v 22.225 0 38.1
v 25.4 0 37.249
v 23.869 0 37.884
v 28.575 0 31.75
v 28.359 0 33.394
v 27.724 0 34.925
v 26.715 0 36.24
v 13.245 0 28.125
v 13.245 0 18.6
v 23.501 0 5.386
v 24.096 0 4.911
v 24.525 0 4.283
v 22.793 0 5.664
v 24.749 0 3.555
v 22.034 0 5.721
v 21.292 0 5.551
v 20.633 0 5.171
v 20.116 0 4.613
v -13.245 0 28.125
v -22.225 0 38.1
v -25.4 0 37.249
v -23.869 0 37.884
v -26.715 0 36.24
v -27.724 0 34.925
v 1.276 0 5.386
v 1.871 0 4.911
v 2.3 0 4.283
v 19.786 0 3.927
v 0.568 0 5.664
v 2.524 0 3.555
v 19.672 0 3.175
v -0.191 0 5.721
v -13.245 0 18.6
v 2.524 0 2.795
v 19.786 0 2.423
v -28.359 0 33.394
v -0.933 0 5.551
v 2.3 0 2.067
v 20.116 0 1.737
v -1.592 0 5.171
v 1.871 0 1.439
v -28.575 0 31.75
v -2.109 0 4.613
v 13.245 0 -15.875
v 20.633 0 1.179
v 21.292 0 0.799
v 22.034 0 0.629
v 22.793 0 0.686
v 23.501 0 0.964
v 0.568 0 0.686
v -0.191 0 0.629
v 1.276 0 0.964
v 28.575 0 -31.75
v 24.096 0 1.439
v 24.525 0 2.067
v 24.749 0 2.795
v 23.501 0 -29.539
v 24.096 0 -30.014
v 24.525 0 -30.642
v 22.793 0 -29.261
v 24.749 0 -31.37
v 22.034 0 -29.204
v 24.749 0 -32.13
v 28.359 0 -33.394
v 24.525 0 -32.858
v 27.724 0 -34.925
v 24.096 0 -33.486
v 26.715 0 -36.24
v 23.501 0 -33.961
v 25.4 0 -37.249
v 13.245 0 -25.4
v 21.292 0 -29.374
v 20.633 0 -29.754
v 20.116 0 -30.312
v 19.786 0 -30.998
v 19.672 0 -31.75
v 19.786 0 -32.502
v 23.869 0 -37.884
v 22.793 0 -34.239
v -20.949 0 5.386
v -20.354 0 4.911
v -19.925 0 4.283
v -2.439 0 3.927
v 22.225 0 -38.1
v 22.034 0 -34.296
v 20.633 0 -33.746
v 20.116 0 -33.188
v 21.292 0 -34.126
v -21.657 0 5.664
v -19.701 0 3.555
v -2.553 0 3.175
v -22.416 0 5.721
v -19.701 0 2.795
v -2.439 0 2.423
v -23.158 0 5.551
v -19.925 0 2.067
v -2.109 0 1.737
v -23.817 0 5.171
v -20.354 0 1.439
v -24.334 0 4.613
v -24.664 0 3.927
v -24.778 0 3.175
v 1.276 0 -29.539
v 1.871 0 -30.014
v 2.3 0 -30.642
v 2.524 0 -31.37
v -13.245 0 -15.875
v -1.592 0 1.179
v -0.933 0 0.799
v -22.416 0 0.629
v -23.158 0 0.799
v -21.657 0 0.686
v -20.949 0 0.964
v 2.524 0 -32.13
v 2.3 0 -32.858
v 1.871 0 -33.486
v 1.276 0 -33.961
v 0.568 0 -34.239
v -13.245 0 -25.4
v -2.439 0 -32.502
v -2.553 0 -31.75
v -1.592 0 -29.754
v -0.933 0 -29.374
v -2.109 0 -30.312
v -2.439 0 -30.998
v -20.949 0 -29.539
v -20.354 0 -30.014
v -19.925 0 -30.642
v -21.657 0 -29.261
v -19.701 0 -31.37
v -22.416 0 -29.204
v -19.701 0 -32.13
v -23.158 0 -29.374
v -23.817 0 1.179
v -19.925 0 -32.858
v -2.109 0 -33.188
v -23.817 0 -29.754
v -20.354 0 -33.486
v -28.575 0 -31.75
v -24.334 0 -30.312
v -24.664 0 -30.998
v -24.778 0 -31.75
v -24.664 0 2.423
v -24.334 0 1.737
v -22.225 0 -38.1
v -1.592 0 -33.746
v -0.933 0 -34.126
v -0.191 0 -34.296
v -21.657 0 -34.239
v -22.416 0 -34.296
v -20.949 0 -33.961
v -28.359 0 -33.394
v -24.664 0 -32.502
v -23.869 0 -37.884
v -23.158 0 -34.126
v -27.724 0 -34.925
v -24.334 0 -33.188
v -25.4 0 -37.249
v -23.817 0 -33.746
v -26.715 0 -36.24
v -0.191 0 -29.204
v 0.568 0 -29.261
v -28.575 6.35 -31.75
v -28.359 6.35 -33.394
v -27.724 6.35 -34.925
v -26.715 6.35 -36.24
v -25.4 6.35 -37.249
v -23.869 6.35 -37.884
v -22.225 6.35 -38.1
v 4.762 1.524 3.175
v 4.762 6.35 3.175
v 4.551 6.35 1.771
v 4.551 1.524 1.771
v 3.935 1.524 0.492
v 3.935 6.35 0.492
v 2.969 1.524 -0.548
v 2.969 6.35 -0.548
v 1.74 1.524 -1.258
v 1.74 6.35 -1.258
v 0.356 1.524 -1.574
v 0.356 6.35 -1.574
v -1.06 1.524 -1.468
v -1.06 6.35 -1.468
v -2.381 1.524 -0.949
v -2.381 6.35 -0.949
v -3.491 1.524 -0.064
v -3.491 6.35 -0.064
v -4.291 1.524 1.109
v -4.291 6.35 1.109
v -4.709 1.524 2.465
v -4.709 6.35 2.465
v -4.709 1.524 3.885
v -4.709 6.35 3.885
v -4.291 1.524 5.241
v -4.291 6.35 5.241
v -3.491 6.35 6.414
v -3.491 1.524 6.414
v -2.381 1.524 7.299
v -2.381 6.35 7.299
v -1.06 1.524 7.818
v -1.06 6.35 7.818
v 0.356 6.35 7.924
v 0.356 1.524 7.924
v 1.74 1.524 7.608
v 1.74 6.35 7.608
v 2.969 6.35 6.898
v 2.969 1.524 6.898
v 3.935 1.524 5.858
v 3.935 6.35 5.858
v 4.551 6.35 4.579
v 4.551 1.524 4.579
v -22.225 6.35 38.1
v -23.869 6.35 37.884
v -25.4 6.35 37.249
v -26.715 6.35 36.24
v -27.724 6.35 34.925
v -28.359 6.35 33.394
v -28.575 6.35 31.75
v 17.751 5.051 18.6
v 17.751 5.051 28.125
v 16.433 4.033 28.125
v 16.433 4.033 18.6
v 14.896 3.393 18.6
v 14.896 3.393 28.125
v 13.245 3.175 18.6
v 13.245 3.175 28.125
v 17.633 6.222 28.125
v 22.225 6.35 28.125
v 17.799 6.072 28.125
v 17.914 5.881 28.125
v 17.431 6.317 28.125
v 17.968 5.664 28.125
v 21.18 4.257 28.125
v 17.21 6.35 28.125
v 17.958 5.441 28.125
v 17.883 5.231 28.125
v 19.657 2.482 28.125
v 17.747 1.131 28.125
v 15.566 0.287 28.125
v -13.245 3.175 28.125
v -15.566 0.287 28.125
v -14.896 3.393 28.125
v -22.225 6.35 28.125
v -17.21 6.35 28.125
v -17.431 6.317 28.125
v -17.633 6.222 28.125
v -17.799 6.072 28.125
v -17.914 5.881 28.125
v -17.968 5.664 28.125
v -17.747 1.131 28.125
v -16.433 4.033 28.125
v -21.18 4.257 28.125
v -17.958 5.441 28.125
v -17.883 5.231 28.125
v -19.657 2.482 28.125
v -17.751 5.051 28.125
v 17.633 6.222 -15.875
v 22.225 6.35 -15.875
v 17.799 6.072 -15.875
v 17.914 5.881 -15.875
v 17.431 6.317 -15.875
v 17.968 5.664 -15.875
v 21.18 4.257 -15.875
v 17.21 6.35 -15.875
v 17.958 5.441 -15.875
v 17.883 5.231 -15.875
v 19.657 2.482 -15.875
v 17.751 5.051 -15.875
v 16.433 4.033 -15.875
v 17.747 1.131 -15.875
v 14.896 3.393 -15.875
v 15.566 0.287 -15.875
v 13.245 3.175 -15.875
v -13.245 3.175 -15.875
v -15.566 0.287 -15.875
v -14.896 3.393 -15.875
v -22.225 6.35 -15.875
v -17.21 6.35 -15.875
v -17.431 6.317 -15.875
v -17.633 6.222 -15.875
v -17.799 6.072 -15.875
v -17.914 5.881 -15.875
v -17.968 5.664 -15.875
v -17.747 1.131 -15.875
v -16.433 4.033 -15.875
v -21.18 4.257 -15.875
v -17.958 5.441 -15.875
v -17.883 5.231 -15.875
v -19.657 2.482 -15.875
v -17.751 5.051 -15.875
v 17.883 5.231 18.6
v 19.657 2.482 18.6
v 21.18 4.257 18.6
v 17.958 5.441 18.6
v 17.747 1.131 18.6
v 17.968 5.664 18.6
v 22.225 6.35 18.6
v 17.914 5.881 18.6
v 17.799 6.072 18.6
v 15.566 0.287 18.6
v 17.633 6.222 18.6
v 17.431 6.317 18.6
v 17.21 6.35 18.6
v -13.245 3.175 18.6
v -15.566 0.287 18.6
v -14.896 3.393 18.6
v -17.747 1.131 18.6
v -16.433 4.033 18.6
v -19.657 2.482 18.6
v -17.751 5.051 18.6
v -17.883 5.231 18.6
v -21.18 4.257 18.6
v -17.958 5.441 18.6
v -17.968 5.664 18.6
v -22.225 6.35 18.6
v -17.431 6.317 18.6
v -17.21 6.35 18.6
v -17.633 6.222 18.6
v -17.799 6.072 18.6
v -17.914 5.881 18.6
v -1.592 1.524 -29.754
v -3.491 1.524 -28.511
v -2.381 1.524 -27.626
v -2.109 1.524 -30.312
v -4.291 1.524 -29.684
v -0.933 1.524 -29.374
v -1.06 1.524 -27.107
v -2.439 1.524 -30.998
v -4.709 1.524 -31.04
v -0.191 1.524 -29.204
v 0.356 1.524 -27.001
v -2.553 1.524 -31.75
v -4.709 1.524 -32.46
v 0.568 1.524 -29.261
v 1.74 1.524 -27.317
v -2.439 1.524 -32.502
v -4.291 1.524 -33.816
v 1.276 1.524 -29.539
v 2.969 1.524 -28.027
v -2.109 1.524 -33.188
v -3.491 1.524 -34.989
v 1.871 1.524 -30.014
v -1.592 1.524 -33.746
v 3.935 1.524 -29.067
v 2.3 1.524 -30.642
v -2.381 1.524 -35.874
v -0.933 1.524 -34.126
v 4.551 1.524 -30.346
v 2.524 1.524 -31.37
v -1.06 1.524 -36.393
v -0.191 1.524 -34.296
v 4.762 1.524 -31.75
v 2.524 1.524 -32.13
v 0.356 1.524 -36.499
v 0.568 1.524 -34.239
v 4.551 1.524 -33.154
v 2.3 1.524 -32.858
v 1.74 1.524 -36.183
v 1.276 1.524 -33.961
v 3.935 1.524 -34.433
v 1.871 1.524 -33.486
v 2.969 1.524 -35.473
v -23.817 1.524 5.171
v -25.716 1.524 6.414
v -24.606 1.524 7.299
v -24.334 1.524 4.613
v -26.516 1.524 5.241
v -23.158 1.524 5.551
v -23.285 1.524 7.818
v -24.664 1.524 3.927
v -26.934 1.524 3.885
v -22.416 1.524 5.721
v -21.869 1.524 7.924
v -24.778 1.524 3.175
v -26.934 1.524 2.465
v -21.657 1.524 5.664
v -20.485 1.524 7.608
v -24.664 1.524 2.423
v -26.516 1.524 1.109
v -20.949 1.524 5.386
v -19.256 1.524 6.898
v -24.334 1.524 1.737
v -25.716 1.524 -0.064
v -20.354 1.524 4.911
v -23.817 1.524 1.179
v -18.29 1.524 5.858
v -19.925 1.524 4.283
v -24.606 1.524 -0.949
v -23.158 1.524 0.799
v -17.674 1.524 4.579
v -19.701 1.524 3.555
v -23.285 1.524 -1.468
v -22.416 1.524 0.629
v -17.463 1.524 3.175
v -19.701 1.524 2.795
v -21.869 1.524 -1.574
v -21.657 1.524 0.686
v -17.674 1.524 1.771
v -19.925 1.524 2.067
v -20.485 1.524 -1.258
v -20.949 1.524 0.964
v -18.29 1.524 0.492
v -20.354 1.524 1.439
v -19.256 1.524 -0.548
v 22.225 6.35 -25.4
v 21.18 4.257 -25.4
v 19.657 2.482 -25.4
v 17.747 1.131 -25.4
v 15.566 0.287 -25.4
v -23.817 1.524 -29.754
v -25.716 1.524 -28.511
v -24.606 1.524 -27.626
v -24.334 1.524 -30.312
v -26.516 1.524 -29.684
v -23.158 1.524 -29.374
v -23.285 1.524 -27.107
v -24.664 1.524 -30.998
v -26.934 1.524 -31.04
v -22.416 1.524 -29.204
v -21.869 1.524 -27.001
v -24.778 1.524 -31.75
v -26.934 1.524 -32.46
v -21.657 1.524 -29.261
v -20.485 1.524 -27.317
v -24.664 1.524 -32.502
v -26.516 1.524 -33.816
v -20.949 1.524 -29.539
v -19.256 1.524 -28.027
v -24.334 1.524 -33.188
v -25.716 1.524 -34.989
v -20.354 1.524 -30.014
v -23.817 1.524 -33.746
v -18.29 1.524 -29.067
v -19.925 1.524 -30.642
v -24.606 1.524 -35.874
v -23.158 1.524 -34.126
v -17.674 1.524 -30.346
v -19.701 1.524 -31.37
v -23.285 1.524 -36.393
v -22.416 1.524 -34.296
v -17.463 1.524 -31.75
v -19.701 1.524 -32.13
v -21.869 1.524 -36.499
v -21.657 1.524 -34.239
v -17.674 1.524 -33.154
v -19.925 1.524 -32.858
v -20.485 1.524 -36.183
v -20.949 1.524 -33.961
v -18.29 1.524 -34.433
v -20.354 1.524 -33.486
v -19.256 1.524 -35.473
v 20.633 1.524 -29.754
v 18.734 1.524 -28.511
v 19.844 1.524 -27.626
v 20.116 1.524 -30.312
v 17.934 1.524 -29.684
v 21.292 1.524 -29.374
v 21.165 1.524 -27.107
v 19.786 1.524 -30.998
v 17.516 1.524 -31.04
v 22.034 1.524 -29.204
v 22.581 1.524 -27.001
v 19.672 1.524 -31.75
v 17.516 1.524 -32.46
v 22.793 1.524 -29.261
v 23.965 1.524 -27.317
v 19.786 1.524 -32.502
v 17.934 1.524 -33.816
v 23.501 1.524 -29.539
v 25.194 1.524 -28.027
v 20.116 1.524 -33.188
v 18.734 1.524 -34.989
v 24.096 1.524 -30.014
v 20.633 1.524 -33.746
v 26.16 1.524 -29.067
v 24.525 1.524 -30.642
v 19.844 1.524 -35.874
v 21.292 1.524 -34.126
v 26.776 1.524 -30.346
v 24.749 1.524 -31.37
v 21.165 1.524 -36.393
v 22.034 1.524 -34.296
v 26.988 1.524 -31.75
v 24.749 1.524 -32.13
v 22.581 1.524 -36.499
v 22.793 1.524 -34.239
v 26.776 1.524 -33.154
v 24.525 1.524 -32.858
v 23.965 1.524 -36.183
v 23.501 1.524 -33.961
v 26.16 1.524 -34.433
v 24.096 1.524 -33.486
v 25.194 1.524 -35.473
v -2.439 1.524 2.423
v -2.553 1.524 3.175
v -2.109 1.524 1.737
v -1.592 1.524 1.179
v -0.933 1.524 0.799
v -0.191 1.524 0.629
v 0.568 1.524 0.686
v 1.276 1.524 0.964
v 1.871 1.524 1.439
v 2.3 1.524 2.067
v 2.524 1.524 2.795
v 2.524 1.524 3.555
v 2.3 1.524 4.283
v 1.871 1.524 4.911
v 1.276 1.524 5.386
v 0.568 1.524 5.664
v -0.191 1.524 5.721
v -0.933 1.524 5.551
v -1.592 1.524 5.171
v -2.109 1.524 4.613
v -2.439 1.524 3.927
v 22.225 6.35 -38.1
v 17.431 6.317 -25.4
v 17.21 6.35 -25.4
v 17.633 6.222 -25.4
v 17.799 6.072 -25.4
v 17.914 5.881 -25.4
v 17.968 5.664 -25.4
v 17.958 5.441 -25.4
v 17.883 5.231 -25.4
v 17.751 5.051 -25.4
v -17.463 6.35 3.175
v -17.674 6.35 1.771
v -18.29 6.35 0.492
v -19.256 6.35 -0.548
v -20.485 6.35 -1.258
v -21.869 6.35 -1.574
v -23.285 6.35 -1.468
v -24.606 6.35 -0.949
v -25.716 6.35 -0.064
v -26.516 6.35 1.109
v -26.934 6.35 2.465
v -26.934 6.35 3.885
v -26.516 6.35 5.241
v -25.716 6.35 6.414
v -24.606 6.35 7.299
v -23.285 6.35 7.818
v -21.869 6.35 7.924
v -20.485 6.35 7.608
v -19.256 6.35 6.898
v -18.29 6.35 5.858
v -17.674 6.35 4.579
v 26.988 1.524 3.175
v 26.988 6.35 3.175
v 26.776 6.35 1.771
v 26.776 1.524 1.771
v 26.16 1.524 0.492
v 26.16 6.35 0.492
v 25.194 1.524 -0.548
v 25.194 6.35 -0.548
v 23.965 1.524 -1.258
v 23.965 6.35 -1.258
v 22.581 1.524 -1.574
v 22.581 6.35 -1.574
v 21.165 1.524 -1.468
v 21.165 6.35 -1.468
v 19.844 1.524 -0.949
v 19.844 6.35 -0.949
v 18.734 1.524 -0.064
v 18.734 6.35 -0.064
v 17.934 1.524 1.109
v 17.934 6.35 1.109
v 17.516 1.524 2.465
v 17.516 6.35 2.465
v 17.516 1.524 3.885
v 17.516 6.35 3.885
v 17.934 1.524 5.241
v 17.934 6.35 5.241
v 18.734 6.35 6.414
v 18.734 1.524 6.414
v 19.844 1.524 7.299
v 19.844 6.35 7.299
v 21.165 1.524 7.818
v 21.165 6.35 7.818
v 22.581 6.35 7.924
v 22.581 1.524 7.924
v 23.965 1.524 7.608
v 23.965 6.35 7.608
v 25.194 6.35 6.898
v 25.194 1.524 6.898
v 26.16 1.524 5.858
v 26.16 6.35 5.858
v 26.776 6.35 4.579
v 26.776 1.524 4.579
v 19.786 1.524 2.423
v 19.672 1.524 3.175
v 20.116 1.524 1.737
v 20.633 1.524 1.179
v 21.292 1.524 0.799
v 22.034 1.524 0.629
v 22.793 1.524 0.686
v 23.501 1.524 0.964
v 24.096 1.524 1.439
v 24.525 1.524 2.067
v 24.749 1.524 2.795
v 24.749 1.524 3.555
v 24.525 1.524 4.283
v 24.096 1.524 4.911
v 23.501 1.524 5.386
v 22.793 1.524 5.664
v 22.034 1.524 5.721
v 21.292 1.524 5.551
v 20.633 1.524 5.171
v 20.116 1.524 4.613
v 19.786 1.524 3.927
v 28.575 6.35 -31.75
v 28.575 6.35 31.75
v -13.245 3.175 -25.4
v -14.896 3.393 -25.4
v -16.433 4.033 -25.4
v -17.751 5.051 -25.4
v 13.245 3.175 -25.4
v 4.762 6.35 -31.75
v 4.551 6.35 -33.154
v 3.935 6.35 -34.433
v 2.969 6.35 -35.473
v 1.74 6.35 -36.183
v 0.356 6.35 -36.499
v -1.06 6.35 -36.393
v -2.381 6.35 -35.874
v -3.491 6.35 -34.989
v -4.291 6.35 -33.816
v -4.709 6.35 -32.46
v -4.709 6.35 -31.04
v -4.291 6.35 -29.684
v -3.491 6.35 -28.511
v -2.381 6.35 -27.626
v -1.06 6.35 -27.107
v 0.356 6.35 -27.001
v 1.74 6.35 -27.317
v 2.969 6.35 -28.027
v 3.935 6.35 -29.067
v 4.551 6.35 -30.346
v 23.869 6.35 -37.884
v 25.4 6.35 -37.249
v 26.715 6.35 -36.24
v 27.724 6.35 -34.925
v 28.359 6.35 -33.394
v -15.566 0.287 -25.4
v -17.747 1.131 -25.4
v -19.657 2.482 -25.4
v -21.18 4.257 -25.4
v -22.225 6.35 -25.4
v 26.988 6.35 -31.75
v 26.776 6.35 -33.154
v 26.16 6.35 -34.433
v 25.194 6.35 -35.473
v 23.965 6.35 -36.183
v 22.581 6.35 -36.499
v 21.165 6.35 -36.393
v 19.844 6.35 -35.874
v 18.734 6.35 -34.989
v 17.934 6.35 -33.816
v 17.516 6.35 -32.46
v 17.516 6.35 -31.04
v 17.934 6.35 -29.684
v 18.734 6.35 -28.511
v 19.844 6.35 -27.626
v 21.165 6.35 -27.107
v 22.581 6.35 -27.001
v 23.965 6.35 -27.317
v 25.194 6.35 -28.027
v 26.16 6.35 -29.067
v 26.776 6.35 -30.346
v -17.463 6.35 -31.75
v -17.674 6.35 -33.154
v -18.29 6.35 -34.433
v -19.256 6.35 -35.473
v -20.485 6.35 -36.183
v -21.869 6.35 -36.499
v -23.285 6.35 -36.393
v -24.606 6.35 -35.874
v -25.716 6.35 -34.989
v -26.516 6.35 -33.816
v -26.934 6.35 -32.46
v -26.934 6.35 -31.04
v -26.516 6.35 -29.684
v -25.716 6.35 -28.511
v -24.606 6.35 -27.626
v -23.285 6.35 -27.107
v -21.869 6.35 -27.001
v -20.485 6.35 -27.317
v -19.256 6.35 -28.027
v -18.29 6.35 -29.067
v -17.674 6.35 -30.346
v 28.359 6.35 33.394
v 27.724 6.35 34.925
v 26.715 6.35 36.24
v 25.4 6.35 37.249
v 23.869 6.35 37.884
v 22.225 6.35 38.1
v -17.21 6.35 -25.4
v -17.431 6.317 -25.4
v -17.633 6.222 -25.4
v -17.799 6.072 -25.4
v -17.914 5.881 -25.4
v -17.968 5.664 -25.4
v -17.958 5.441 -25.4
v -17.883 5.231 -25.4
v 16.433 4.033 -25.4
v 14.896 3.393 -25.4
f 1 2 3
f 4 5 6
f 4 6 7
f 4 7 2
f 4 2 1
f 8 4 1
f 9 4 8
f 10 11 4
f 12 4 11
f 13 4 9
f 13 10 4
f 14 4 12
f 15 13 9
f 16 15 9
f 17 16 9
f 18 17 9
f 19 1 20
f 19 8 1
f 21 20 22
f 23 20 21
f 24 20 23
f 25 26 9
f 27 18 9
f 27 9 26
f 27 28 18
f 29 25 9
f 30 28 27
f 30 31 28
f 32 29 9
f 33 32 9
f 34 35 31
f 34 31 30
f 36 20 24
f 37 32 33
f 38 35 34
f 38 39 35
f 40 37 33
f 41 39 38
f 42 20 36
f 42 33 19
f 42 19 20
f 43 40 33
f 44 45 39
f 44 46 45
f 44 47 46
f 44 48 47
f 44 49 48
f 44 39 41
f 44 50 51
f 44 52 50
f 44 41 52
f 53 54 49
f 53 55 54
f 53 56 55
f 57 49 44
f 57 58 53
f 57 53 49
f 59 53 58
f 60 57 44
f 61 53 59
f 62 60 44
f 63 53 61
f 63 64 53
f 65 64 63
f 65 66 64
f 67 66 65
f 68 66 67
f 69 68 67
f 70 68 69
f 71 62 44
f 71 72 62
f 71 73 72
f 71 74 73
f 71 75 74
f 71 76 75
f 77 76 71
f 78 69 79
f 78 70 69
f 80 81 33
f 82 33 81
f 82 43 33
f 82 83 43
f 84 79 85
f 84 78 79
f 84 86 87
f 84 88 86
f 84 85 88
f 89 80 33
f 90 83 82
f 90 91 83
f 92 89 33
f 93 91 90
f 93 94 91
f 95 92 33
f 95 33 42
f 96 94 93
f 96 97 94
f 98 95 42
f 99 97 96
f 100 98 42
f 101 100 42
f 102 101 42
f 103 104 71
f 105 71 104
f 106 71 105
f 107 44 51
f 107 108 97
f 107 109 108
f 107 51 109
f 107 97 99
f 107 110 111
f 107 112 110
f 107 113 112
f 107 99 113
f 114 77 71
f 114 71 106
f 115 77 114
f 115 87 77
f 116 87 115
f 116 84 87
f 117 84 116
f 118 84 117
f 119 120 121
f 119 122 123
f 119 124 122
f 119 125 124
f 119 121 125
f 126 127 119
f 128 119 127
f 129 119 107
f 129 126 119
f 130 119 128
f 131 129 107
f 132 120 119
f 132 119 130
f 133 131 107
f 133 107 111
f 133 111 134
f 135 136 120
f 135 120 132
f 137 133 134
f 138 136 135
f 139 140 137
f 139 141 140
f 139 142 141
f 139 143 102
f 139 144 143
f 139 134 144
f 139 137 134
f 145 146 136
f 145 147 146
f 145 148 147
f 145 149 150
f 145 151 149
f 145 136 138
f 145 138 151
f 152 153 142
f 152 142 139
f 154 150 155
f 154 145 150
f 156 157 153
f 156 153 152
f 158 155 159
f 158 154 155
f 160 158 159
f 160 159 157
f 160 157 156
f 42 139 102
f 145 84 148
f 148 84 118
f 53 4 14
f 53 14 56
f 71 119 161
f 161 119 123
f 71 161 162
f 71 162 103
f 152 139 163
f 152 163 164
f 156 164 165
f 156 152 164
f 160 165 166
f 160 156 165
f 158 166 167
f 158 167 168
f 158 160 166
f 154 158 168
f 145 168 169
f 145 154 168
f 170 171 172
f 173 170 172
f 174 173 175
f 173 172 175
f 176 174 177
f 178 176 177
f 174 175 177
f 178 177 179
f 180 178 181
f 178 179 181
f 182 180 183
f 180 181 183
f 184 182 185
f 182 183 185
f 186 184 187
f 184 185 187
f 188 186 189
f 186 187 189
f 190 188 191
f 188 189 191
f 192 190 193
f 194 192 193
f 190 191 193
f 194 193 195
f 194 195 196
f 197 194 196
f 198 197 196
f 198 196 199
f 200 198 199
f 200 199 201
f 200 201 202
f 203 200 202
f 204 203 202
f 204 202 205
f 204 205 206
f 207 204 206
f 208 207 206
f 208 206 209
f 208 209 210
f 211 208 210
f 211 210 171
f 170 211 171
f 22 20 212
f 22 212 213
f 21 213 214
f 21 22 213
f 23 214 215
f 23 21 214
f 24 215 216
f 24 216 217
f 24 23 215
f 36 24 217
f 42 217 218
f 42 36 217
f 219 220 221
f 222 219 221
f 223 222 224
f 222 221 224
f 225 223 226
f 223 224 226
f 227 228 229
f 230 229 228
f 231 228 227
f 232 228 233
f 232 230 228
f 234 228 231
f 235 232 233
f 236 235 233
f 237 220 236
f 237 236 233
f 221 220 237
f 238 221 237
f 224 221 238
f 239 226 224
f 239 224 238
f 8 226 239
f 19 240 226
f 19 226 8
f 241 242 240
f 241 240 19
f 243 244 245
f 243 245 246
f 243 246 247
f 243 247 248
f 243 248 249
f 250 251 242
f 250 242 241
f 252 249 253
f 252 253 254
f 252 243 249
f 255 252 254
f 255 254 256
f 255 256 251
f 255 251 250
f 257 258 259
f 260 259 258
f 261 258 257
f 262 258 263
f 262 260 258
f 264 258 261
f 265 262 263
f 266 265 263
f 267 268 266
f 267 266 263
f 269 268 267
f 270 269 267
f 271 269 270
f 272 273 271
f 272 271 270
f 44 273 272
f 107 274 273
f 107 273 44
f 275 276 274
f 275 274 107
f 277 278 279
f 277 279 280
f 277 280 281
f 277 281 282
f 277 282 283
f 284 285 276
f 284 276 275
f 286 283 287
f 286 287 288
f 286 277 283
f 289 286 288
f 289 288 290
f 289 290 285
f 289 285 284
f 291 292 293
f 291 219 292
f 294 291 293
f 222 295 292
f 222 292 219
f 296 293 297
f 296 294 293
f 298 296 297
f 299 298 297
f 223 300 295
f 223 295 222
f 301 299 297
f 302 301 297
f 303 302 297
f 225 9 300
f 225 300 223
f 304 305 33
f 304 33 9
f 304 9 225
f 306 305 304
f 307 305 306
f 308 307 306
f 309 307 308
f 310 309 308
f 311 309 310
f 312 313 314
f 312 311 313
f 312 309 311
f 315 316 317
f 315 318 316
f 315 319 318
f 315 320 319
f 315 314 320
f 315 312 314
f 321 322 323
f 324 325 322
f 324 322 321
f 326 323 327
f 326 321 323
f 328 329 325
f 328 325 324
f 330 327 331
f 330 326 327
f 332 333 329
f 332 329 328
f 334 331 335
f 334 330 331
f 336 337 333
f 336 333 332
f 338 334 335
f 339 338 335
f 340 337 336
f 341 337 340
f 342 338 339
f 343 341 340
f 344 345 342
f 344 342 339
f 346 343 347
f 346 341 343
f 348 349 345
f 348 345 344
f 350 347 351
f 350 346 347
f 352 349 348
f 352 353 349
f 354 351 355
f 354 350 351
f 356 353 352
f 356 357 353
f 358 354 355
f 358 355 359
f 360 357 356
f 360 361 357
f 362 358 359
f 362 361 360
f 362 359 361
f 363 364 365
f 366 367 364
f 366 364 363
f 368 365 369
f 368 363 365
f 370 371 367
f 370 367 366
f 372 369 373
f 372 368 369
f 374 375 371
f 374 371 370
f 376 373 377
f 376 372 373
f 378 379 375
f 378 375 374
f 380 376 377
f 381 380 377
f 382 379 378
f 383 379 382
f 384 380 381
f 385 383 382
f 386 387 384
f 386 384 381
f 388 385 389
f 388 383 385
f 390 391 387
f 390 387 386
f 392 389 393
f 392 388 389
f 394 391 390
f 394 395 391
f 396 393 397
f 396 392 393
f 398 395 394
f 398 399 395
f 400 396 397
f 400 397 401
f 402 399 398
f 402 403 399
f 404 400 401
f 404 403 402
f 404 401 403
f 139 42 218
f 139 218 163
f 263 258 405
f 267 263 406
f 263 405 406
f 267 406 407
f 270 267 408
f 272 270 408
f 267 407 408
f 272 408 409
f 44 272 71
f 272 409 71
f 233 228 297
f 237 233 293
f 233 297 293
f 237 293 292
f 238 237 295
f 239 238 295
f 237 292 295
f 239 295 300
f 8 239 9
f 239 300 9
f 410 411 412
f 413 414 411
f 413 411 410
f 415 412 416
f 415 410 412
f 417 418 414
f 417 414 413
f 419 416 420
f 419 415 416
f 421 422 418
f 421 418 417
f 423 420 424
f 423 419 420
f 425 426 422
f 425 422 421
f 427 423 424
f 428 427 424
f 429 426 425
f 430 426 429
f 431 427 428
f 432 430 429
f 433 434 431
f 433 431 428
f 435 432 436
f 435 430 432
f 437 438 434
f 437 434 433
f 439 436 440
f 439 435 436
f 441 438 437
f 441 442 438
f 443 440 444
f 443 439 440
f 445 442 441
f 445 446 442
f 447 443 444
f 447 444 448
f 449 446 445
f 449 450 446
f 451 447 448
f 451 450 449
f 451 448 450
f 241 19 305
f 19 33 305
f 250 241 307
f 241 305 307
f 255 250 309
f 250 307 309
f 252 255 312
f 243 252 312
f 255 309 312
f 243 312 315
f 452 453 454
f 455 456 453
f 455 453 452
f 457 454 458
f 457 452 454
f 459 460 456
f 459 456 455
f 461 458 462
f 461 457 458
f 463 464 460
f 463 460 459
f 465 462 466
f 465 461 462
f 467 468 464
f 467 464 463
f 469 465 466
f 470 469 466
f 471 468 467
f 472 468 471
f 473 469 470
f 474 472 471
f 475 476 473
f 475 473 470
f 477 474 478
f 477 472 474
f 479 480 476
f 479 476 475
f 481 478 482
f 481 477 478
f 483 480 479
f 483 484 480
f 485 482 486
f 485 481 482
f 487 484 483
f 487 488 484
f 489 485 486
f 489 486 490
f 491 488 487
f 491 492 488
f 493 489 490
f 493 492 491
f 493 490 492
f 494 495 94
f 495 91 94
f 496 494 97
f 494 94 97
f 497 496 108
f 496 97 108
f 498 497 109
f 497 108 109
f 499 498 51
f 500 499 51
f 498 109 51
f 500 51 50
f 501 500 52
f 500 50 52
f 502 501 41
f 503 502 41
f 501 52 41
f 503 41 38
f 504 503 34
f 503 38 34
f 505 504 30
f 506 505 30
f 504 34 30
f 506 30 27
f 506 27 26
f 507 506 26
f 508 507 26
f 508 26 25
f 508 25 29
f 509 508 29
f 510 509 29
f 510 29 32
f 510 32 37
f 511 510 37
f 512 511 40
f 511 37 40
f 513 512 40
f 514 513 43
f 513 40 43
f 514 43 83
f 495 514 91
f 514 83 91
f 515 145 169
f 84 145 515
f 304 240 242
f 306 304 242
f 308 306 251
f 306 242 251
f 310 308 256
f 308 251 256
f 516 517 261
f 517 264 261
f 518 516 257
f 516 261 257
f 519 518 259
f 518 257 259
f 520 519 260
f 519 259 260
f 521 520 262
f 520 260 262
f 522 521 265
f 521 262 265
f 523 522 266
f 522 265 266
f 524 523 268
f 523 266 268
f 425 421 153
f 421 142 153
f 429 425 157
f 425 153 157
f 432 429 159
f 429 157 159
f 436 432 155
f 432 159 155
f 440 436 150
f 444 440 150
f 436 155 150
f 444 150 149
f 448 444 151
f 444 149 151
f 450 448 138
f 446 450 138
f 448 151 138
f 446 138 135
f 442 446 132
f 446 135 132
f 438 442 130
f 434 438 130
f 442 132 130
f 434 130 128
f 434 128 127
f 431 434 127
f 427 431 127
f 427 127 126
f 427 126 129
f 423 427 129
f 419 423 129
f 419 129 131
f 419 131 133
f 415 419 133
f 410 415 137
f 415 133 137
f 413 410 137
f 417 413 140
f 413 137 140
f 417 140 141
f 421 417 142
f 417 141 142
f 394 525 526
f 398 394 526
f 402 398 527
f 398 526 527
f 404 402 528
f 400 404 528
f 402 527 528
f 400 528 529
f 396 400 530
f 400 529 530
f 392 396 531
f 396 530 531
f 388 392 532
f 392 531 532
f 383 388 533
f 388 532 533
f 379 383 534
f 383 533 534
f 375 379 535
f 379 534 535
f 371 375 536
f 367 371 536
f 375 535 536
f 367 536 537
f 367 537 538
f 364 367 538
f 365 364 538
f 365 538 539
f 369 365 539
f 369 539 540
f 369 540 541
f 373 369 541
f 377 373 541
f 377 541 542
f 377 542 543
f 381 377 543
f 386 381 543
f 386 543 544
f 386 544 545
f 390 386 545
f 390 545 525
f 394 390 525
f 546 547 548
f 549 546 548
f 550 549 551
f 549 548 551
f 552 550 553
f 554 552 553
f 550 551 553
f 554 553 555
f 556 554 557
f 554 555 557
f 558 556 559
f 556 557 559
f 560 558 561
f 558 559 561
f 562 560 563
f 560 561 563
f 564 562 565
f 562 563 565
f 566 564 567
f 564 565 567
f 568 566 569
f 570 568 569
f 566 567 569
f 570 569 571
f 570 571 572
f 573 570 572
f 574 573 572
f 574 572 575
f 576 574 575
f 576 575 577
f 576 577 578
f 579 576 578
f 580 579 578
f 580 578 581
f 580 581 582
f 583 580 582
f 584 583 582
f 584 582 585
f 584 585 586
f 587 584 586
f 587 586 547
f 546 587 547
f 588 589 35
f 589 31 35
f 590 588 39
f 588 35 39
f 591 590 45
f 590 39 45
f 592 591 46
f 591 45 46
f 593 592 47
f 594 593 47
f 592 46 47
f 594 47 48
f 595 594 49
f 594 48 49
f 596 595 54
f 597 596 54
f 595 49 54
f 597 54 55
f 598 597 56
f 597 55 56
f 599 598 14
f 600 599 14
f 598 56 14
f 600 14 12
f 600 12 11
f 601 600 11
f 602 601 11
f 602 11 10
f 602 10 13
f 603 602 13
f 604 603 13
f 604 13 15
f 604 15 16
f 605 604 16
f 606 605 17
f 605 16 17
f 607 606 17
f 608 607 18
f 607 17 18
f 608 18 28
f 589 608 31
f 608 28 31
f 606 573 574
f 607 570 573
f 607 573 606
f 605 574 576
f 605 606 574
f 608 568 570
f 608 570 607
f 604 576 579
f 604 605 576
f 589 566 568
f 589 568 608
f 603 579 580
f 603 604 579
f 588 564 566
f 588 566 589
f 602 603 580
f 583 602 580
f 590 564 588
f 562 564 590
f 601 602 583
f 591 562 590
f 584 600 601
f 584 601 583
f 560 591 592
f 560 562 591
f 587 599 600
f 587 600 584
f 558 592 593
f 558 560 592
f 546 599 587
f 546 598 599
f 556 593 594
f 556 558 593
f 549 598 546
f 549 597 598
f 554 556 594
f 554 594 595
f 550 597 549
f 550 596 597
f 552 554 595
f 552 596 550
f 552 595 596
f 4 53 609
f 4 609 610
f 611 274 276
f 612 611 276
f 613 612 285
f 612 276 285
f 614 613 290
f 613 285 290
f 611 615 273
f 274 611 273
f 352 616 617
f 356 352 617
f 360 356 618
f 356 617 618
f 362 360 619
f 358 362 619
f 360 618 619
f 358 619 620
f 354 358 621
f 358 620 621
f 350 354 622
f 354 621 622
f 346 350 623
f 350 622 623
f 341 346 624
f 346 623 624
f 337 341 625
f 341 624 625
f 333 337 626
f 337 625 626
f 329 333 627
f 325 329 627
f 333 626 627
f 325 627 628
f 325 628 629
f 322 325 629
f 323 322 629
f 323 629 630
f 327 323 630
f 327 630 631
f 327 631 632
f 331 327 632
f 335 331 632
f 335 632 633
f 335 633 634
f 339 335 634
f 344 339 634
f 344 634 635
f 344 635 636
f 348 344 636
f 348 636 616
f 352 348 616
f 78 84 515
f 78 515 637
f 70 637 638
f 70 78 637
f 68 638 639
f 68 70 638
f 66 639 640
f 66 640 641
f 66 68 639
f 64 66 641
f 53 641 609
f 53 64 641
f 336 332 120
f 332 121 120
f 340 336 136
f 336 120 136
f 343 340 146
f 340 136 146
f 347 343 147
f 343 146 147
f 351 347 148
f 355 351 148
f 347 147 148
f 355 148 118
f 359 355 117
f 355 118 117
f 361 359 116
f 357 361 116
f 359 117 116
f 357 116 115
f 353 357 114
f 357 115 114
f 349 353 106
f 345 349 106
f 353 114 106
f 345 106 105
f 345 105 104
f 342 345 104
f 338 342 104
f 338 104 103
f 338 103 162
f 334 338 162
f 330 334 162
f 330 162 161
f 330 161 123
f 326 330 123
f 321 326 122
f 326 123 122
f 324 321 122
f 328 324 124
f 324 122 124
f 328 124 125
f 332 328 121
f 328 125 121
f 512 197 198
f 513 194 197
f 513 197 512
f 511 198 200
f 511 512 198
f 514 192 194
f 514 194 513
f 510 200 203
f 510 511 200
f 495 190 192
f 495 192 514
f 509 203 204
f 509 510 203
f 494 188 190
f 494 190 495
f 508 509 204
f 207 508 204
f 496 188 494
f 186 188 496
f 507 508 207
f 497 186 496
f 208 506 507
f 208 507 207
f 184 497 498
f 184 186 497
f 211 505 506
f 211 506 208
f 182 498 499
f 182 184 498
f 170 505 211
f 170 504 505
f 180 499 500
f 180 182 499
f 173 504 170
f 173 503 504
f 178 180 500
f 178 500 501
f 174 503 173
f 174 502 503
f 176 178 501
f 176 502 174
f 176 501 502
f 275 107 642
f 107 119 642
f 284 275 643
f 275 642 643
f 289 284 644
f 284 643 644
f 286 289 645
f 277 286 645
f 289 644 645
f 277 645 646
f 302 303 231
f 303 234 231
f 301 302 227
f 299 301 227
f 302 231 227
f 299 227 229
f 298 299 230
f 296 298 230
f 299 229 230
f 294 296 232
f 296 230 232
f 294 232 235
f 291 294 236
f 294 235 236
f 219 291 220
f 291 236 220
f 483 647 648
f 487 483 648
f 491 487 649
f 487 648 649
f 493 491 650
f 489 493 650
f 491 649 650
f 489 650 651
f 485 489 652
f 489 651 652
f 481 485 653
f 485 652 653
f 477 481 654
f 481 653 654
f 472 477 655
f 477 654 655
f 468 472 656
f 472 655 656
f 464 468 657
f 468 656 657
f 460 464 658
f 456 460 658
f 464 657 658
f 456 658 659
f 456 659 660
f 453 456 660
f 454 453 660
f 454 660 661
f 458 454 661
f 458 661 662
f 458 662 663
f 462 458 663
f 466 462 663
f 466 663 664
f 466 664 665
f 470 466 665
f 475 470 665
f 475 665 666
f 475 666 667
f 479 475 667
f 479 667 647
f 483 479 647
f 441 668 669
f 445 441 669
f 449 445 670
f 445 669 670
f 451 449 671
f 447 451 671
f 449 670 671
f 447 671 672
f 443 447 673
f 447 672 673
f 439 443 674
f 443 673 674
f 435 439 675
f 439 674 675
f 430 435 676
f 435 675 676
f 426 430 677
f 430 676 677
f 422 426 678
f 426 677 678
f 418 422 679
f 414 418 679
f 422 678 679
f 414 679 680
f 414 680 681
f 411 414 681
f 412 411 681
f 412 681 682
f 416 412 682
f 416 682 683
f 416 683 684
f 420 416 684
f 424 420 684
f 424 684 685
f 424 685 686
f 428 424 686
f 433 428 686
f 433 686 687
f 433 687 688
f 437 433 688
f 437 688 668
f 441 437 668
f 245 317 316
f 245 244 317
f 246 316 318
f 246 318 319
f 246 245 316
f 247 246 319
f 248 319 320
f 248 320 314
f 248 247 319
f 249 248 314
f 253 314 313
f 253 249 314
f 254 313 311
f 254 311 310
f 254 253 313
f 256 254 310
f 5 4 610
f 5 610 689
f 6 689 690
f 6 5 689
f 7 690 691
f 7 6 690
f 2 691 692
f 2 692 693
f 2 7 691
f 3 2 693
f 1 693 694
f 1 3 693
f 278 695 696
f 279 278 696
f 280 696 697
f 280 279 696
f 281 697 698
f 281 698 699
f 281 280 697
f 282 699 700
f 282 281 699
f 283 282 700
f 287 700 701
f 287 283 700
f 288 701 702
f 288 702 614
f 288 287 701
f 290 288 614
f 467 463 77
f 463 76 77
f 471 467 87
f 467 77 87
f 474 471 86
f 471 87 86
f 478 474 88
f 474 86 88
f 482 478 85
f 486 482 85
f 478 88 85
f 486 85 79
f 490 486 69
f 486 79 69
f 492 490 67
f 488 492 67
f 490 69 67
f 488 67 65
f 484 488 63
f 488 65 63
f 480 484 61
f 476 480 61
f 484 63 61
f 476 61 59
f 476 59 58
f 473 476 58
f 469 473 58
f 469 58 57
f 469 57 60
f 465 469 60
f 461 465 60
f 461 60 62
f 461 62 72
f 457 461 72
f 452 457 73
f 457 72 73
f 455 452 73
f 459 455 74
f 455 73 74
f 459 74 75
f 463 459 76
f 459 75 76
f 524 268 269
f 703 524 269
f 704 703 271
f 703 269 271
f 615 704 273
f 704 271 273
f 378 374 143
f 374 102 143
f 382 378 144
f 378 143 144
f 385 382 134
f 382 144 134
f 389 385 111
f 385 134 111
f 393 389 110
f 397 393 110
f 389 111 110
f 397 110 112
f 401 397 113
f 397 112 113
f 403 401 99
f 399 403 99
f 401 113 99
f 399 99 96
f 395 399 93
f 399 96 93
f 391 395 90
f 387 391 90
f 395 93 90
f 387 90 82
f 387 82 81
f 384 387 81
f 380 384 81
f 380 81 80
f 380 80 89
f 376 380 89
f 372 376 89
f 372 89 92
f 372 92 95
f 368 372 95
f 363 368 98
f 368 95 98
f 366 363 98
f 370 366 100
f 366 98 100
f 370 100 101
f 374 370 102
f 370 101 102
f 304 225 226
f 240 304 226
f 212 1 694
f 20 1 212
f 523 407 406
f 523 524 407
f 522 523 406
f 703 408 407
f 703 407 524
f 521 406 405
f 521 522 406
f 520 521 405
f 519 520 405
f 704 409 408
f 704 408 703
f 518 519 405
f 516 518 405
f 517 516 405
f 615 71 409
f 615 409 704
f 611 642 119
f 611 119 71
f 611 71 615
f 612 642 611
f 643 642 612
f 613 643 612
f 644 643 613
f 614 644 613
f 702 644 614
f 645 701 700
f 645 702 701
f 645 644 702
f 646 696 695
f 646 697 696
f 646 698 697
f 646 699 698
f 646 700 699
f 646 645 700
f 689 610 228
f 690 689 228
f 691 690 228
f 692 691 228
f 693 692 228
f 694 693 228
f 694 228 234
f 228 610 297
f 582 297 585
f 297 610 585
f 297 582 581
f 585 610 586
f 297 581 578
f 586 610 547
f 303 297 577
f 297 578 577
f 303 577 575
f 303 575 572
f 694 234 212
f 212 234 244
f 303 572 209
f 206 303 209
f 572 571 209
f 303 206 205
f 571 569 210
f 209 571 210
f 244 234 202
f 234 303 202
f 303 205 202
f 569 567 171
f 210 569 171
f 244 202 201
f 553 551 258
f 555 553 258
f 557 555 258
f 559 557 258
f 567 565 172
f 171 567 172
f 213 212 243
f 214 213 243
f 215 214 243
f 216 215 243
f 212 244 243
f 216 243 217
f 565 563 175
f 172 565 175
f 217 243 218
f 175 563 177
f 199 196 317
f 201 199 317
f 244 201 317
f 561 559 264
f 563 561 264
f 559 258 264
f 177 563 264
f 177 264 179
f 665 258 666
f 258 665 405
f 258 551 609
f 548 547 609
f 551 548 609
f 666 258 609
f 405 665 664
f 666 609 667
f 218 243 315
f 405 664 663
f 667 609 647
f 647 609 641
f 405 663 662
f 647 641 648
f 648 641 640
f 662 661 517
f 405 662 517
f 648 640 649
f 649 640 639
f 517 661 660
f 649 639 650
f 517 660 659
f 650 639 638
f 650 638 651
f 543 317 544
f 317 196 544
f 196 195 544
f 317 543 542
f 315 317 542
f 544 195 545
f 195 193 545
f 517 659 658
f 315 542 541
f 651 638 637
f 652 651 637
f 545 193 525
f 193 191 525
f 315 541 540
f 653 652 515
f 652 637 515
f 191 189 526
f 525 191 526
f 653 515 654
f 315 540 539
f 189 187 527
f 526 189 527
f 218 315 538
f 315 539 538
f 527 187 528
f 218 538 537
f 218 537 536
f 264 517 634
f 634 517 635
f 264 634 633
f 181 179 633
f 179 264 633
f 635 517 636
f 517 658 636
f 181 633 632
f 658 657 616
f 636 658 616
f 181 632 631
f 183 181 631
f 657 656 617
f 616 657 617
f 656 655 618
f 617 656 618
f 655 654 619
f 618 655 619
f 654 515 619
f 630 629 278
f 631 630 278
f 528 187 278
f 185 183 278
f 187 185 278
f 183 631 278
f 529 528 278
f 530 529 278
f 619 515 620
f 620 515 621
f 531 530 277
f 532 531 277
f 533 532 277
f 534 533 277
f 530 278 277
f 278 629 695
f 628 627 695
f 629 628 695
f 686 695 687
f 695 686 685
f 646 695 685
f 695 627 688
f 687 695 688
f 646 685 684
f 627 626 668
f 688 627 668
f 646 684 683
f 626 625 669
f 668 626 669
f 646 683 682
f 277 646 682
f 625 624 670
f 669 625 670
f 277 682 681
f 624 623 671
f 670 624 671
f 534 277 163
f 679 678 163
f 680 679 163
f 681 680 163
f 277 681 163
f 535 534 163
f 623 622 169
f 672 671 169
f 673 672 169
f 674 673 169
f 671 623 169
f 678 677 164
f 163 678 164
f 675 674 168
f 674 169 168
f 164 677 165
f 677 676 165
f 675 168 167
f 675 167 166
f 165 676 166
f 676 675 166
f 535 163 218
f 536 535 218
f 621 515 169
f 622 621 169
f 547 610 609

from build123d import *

# Parameters (mm, degrees)
BOSS_EXTRUDE1_DEPTH                             = 6.35
CBORE_FOR_10_SOCKET_HEAD_CAP_SCREW1_D           = 5.1054
CBORE_FOR_10_SOCKET_HEAD_CAP_SCREW1_CBORE_D     = 9.525
CBORE_FOR_10_SOCKET_HEAD_CAP_SCREW1_CBORE_DEPTH = 4.826
SKETCH5_W                                       = 9.525
SKETCH5_H                                       = 3.175
FILLET1_R                                       = 0.762


with BuildPart() as part:
    # Sketch1 → Boss-Extrude1 (new body)
    with BuildSketch(Plane(origin=(0, 0, 0), x_dir=(1, 0, 0), z_dir=(0, 1, 0))):
        with BuildLine():
            Line((22.225, -38.1), (-22.225, -38.1))
            ThreePointArc((-22.225, -38.1), (-26.715128061, -36.240128061), (-28.575, -31.75))
            Line((-28.575, -31.75), (-28.575, 31.75))
            ThreePointArc((-28.575, 31.75), (-26.715128061, 36.240128061), (-22.225, 38.1))
            Line((-22.225, 38.1), (22.225, 38.1))
            ThreePointArc((22.225, 38.1), (26.715128061, 36.240128061), (28.575, 31.75))
            Line((28.575, 31.75), (28.575, -31.75))
            ThreePointArc((28.575, -31.75), (26.715128061, -36.240128061), (22.225, -38.1))
        make_face()
    extrude(amount=BOSS_EXTRUDE1_DEPTH)

    # CBORE for #10 Socket Head Cap Screw1 (through all)
    with Locations(Plane(origin=(0, 6.35, 0), x_dir=(1, 0, 0), z_dir=(0, 1, 0))):
        with Locations((-22.225, 31.75), (0, 31.75), (22.225, 31.75), (0, -3.175), (22.225, -3.175), (-22.225, -3.175)):
            CounterBoreHole(CBORE_FOR_10_SOCKET_HEAD_CAP_SCREW1_D / 2, CBORE_FOR_10_SOCKET_HEAD_CAP_SCREW1_CBORE_D / 2, CBORE_FOR_10_SOCKET_HEAD_CAP_SCREW1_CBORE_DEPTH)

    # Cut-Sweep1: sweep along a path in Sketch6
    with BuildLine(Plane.XY) as cut_sweep1_path:
        ThreePointArc((22.225, 6.35), (18.744005193, 1.747870067), (13.244743879, 0))
        Line((13.244743879, 0), (-13.244743879, 0))
        ThreePointArc((-13.244743879, 0), (-18.744005193, 1.747870067), (-22.225, 6.35))
    # Sketch5 → Cut-Sweep1 (sweep, cut)
    with BuildSketch(Plane(origin=(0, 0, 0), x_dir=(0, 0, -1), z_dir=(1, 0, 0))):
        with Locations((20.6375, 1.5875)):
            Rectangle(SKETCH5_W, SKETCH5_H)
        with Locations((-23.3625, 1.5875)):
            Rectangle(SKETCH5_W, SKETCH5_H)
    sweep(path=cut_sweep1_path.line, mode=Mode.SUBTRACT)

    # Fillet1
    fillet1_edges = [part.edges().sort_by_distance(p)[0] for p in [
        (18.744005193, 6.35, 23.3625),
        (-18.744005193, 6.35, 23.3625),
        (18.744005193, 6.35, -20.6375),
        (-18.744005193, 6.35, -20.6375),
    ]]
    fillet(fillet1_edges, radius=FILLET1_R)


solid = part.part
